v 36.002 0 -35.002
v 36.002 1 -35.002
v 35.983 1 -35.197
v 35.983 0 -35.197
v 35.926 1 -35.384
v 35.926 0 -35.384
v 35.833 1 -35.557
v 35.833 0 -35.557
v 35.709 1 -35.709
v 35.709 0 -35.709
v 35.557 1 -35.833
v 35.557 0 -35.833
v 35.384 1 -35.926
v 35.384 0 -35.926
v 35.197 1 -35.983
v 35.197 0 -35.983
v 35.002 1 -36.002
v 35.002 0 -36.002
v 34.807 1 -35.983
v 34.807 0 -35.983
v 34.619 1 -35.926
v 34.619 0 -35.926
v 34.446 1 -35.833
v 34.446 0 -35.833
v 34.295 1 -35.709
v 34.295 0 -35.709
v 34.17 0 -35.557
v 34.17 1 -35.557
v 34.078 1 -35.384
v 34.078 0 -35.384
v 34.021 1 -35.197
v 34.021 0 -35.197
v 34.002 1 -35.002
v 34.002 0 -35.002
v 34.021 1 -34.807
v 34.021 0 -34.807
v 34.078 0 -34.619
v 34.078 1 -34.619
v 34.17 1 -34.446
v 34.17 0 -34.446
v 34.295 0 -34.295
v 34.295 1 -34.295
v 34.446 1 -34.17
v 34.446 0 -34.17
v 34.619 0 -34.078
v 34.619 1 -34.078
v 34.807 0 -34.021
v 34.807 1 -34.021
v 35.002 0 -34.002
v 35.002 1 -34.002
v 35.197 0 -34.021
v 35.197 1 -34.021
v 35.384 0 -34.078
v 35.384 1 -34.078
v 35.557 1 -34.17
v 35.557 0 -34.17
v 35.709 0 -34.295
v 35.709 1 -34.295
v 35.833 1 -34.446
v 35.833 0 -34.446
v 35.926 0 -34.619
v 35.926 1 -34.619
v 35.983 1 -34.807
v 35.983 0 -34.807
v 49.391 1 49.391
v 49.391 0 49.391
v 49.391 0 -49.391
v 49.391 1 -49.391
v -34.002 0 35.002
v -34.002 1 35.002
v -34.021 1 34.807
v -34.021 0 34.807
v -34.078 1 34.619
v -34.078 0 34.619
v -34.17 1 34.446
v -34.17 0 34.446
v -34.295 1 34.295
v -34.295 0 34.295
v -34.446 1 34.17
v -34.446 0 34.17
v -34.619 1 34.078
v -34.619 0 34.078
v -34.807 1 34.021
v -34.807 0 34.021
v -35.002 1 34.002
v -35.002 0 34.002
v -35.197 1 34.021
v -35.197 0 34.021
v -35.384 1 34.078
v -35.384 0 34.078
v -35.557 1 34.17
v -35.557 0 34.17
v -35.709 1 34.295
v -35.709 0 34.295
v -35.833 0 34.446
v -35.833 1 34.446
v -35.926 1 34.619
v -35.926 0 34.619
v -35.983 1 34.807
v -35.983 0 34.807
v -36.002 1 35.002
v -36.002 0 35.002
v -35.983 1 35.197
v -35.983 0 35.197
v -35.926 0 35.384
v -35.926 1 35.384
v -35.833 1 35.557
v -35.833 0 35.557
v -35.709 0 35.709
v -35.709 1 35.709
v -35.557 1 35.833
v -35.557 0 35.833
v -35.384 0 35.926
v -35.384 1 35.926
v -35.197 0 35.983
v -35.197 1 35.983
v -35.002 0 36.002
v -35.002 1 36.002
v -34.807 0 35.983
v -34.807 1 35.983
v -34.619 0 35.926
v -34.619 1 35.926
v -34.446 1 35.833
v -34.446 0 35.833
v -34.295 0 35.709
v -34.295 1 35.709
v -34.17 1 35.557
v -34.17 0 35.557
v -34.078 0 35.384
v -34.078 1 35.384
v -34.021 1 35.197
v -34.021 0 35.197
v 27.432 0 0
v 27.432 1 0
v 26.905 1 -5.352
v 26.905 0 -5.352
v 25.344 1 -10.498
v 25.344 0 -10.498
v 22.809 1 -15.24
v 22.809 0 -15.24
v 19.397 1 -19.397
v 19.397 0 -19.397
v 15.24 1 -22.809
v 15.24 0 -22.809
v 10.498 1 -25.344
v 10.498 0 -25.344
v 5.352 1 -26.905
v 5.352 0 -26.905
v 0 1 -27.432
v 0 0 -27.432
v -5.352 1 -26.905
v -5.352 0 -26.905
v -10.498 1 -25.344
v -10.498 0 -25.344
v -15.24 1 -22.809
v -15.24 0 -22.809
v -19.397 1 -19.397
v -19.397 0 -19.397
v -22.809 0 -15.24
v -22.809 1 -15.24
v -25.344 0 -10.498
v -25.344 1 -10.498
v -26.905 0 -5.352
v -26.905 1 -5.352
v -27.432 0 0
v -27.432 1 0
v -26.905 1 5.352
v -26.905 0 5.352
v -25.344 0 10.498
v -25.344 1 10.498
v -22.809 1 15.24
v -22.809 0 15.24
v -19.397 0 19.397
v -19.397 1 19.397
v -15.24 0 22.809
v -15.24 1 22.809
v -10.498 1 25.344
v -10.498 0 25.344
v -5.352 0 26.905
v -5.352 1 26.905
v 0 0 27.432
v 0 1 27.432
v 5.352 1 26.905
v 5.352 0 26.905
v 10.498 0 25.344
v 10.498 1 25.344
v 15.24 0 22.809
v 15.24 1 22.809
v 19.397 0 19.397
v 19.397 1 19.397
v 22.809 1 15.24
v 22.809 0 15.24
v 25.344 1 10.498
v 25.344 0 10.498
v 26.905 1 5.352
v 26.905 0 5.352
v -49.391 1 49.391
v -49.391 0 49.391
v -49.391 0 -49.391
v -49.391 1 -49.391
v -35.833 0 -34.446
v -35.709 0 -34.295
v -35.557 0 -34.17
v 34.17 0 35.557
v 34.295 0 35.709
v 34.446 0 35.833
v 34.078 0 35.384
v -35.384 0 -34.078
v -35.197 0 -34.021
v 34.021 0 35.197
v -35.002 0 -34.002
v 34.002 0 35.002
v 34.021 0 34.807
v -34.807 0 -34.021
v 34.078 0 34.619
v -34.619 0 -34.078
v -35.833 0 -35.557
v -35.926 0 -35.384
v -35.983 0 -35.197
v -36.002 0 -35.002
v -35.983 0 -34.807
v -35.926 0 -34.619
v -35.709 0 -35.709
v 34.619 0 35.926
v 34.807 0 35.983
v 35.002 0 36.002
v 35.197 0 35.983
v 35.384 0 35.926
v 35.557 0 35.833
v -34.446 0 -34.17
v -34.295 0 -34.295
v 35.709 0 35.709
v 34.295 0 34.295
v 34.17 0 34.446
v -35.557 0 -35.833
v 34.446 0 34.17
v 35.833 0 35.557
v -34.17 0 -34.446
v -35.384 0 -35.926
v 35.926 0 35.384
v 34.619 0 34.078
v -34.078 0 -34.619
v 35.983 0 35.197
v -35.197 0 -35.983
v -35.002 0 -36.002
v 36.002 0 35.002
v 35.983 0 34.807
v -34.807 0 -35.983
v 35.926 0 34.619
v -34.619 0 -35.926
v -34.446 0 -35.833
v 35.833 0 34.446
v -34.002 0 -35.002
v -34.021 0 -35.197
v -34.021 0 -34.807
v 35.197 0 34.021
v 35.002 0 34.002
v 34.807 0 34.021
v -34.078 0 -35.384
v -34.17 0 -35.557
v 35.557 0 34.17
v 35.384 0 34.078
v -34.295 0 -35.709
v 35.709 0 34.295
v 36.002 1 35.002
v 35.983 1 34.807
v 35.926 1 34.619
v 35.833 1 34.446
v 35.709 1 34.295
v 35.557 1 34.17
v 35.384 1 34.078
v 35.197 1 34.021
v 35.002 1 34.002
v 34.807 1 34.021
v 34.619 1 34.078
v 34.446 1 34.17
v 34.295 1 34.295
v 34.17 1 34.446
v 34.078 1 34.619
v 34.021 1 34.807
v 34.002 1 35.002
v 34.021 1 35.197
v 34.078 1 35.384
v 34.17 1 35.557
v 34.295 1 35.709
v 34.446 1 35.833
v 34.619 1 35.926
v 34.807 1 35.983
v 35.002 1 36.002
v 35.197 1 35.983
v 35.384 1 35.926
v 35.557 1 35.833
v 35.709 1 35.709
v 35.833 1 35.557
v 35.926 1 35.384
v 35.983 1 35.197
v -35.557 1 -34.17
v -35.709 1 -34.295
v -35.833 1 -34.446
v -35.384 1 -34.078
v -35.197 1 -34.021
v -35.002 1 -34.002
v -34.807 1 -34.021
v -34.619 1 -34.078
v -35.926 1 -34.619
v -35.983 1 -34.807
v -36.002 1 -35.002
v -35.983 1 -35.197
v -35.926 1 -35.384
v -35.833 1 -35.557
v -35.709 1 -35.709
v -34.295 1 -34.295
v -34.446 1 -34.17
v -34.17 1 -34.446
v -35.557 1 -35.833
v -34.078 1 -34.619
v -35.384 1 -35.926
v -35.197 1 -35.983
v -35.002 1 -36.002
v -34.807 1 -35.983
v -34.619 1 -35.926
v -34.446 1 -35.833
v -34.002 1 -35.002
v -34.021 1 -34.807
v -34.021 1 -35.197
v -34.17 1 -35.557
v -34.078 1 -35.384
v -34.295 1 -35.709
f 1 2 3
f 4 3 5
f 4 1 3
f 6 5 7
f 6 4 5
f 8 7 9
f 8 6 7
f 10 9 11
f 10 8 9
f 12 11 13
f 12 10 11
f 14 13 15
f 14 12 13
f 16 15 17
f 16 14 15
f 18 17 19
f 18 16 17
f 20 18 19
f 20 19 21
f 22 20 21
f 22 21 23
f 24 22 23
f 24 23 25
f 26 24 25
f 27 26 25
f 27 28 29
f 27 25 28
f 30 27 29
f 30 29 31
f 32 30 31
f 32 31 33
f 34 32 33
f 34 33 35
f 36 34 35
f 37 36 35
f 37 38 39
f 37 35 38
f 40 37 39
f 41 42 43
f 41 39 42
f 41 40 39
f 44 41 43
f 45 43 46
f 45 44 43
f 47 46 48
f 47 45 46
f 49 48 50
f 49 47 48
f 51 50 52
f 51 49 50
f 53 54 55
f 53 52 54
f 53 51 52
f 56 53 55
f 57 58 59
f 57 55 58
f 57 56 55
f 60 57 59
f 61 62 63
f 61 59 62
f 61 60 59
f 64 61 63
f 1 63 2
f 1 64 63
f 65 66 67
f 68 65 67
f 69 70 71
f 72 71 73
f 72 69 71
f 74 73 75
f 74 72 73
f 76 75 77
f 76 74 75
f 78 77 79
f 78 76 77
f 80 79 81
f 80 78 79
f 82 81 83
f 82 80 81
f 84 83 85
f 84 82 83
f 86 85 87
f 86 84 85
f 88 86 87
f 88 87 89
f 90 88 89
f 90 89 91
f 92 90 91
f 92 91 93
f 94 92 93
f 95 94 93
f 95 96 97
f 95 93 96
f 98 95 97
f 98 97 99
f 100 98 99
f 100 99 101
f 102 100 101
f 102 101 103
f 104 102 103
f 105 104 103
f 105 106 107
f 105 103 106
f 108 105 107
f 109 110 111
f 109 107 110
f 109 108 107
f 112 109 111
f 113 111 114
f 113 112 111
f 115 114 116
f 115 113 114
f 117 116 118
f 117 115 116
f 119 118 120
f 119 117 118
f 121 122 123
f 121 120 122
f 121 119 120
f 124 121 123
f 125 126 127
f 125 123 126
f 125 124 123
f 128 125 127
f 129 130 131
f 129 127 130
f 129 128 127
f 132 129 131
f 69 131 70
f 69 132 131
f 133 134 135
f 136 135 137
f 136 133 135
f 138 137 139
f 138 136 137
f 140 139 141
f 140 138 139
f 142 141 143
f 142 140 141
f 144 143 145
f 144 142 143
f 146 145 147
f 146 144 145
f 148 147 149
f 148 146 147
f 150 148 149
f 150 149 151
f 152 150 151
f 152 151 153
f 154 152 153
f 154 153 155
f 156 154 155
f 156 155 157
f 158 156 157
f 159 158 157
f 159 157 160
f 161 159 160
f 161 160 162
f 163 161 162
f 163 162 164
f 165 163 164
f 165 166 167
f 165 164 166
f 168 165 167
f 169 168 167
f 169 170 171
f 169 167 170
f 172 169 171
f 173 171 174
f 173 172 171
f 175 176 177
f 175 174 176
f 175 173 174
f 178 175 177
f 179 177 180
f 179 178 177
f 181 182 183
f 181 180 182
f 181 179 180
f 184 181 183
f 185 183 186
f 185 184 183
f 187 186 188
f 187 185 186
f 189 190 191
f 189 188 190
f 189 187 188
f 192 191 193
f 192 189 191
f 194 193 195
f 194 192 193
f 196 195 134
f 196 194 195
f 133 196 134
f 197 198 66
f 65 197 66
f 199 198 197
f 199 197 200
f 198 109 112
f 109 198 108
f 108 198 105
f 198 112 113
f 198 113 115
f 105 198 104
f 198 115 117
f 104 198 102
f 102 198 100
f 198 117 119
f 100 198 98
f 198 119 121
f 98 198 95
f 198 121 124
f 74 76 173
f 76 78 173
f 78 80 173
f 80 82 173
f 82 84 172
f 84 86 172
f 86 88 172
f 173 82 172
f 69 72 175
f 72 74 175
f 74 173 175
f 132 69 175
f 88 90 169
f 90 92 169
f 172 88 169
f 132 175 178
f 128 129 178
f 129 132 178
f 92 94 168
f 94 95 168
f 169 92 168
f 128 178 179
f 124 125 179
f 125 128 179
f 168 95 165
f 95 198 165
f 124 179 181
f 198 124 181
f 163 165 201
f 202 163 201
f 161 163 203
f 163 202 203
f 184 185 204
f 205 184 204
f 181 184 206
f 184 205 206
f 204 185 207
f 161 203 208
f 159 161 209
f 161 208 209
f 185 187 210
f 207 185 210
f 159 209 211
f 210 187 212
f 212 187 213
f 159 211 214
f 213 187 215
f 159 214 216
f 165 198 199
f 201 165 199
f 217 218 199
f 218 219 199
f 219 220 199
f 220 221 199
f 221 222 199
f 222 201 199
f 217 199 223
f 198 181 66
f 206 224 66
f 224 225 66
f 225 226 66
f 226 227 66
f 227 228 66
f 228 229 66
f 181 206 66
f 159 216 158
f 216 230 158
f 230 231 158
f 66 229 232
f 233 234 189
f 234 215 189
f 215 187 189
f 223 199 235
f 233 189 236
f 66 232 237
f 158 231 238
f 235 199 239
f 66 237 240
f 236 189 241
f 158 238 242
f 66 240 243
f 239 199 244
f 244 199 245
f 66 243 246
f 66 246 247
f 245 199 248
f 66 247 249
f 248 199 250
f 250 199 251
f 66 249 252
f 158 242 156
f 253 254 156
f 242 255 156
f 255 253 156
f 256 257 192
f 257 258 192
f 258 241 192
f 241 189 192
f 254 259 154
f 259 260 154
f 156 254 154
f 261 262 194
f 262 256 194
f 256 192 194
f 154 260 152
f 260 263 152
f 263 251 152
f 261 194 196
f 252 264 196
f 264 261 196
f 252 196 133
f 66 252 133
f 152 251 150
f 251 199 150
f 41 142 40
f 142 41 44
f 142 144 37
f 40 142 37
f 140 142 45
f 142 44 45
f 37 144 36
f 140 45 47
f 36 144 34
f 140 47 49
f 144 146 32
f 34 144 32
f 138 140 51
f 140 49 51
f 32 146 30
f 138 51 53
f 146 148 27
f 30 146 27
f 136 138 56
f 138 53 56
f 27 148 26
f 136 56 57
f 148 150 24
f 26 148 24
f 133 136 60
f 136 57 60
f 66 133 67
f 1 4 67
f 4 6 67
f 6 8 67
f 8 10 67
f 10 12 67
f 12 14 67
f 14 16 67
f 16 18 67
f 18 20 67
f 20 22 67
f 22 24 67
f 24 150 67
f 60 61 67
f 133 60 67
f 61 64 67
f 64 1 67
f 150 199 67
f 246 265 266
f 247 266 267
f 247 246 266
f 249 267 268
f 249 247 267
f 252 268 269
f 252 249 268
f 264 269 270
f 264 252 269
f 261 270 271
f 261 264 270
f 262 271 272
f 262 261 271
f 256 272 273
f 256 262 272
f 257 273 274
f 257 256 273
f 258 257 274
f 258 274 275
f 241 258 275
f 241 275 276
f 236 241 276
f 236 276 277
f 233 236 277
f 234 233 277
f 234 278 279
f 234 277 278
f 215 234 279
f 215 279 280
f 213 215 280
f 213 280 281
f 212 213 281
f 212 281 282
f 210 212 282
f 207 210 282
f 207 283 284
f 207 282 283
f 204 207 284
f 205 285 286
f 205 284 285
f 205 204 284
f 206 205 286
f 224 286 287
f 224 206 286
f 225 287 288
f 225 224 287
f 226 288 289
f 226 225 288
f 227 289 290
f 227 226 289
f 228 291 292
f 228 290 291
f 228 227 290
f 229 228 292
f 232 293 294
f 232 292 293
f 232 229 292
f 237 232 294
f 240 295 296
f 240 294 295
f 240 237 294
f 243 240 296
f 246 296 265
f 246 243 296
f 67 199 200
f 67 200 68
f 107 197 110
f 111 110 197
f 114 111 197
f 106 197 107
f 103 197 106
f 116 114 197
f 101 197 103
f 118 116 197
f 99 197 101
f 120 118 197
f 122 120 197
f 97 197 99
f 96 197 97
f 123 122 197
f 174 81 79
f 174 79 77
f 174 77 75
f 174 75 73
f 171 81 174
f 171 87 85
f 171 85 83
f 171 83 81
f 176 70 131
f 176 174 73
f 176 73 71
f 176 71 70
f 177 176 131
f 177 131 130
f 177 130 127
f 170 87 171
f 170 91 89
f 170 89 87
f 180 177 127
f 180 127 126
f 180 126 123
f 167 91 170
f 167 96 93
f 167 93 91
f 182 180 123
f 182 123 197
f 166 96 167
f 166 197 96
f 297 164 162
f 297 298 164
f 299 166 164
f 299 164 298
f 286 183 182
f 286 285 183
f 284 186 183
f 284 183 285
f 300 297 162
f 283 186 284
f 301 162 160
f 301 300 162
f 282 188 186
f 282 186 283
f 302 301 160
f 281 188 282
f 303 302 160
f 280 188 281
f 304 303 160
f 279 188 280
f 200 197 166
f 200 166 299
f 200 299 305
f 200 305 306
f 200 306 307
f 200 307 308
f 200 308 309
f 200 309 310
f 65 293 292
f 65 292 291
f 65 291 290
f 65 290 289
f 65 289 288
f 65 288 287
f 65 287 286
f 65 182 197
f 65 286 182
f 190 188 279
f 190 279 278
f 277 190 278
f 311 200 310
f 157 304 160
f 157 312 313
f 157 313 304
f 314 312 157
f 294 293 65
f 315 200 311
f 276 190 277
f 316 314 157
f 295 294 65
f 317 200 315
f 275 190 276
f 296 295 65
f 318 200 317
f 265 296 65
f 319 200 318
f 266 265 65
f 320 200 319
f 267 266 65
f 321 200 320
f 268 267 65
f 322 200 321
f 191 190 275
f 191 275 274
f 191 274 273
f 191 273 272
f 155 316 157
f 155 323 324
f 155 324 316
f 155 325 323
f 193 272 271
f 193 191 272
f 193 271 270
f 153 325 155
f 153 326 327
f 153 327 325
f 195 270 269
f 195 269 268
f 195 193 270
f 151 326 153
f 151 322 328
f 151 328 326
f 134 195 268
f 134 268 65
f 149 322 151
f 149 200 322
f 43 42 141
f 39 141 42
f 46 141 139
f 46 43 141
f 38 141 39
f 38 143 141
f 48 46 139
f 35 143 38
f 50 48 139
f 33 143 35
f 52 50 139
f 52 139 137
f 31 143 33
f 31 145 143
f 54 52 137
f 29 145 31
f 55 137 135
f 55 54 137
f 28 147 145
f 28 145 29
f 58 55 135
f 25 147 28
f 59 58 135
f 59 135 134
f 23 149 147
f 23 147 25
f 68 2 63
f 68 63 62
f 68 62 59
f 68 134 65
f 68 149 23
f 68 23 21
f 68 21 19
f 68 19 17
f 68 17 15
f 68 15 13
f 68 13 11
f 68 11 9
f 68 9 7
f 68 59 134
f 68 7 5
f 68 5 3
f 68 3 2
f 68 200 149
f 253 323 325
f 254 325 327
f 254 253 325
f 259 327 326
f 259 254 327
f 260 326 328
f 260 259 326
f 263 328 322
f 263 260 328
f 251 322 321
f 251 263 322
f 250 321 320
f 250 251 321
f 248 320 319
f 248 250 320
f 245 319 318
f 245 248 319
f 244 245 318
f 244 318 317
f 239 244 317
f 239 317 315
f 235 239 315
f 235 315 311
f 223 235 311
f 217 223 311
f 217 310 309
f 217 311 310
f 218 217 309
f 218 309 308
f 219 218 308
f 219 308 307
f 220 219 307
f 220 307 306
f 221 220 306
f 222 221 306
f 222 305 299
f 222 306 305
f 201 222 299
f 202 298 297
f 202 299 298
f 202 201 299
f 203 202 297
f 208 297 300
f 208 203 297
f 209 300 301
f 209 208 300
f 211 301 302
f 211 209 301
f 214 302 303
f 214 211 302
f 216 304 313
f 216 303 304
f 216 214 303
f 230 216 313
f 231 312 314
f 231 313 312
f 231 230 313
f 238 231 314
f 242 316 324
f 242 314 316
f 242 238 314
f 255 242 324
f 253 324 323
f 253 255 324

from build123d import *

# Parameters (mm, degrees)
SKETCH1_W           = 98.782817332
SKETCH1_H           = 98.782817332
BOSS_EXTRUDE1_DEPTH = 1.000000032
SKETCH3_R           = 0.999998
CUT_EXTRUDE2_DEPTH  = 2.000000032
SKETCH8_R           = 27.432
CUT_EXTRUDE9_DEPTH  = 2.000000032


with BuildPart() as part:
    # Sketch1 → Boss-Extrude1 (new body)
    with BuildSketch(Plane(origin=(0, 0, 0), x_dir=(1, 0, 0), z_dir=(0, 1, 0))):
        Rectangle(SKETCH1_W, SKETCH1_H)
    extrude(amount=BOSS_EXTRUDE1_DEPTH)

    # Sketch3 → Cut-Extrude2 (cut, through all)
    with BuildSketch(Plane(origin=(0, 0, 0), x_dir=(1, 0, 0), z_dir=(0, 1, 0))):
        with Locations((35.001787507, 35.001787507)):
            Circle(SKETCH3_R)
        with Locations((35.001787507, -35.001787507)):
            Circle(SKETCH3_R)
        with Locations((-35.001787507, -35.001787507)):
            Circle(SKETCH3_R)
        with Locations((-35.001787507, 35.001787507)):
            Circle(SKETCH3_R)
    extrude(amount=CUT_EXTRUDE2_DEPTH, mode=Mode.SUBTRACT)

    # Sketch8 → Cut-Extrude9 (cut, through all)
    with BuildSketch(Plane(origin=(0, 0, 0), x_dir=(1, 0, 0), z_dir=(0, 1, 0))):
        Circle(SKETCH8_R)
    extrude(amount=CUT_EXTRUDE9_DEPTH, mode=Mode.SUBTRACT)


solid = part.part
